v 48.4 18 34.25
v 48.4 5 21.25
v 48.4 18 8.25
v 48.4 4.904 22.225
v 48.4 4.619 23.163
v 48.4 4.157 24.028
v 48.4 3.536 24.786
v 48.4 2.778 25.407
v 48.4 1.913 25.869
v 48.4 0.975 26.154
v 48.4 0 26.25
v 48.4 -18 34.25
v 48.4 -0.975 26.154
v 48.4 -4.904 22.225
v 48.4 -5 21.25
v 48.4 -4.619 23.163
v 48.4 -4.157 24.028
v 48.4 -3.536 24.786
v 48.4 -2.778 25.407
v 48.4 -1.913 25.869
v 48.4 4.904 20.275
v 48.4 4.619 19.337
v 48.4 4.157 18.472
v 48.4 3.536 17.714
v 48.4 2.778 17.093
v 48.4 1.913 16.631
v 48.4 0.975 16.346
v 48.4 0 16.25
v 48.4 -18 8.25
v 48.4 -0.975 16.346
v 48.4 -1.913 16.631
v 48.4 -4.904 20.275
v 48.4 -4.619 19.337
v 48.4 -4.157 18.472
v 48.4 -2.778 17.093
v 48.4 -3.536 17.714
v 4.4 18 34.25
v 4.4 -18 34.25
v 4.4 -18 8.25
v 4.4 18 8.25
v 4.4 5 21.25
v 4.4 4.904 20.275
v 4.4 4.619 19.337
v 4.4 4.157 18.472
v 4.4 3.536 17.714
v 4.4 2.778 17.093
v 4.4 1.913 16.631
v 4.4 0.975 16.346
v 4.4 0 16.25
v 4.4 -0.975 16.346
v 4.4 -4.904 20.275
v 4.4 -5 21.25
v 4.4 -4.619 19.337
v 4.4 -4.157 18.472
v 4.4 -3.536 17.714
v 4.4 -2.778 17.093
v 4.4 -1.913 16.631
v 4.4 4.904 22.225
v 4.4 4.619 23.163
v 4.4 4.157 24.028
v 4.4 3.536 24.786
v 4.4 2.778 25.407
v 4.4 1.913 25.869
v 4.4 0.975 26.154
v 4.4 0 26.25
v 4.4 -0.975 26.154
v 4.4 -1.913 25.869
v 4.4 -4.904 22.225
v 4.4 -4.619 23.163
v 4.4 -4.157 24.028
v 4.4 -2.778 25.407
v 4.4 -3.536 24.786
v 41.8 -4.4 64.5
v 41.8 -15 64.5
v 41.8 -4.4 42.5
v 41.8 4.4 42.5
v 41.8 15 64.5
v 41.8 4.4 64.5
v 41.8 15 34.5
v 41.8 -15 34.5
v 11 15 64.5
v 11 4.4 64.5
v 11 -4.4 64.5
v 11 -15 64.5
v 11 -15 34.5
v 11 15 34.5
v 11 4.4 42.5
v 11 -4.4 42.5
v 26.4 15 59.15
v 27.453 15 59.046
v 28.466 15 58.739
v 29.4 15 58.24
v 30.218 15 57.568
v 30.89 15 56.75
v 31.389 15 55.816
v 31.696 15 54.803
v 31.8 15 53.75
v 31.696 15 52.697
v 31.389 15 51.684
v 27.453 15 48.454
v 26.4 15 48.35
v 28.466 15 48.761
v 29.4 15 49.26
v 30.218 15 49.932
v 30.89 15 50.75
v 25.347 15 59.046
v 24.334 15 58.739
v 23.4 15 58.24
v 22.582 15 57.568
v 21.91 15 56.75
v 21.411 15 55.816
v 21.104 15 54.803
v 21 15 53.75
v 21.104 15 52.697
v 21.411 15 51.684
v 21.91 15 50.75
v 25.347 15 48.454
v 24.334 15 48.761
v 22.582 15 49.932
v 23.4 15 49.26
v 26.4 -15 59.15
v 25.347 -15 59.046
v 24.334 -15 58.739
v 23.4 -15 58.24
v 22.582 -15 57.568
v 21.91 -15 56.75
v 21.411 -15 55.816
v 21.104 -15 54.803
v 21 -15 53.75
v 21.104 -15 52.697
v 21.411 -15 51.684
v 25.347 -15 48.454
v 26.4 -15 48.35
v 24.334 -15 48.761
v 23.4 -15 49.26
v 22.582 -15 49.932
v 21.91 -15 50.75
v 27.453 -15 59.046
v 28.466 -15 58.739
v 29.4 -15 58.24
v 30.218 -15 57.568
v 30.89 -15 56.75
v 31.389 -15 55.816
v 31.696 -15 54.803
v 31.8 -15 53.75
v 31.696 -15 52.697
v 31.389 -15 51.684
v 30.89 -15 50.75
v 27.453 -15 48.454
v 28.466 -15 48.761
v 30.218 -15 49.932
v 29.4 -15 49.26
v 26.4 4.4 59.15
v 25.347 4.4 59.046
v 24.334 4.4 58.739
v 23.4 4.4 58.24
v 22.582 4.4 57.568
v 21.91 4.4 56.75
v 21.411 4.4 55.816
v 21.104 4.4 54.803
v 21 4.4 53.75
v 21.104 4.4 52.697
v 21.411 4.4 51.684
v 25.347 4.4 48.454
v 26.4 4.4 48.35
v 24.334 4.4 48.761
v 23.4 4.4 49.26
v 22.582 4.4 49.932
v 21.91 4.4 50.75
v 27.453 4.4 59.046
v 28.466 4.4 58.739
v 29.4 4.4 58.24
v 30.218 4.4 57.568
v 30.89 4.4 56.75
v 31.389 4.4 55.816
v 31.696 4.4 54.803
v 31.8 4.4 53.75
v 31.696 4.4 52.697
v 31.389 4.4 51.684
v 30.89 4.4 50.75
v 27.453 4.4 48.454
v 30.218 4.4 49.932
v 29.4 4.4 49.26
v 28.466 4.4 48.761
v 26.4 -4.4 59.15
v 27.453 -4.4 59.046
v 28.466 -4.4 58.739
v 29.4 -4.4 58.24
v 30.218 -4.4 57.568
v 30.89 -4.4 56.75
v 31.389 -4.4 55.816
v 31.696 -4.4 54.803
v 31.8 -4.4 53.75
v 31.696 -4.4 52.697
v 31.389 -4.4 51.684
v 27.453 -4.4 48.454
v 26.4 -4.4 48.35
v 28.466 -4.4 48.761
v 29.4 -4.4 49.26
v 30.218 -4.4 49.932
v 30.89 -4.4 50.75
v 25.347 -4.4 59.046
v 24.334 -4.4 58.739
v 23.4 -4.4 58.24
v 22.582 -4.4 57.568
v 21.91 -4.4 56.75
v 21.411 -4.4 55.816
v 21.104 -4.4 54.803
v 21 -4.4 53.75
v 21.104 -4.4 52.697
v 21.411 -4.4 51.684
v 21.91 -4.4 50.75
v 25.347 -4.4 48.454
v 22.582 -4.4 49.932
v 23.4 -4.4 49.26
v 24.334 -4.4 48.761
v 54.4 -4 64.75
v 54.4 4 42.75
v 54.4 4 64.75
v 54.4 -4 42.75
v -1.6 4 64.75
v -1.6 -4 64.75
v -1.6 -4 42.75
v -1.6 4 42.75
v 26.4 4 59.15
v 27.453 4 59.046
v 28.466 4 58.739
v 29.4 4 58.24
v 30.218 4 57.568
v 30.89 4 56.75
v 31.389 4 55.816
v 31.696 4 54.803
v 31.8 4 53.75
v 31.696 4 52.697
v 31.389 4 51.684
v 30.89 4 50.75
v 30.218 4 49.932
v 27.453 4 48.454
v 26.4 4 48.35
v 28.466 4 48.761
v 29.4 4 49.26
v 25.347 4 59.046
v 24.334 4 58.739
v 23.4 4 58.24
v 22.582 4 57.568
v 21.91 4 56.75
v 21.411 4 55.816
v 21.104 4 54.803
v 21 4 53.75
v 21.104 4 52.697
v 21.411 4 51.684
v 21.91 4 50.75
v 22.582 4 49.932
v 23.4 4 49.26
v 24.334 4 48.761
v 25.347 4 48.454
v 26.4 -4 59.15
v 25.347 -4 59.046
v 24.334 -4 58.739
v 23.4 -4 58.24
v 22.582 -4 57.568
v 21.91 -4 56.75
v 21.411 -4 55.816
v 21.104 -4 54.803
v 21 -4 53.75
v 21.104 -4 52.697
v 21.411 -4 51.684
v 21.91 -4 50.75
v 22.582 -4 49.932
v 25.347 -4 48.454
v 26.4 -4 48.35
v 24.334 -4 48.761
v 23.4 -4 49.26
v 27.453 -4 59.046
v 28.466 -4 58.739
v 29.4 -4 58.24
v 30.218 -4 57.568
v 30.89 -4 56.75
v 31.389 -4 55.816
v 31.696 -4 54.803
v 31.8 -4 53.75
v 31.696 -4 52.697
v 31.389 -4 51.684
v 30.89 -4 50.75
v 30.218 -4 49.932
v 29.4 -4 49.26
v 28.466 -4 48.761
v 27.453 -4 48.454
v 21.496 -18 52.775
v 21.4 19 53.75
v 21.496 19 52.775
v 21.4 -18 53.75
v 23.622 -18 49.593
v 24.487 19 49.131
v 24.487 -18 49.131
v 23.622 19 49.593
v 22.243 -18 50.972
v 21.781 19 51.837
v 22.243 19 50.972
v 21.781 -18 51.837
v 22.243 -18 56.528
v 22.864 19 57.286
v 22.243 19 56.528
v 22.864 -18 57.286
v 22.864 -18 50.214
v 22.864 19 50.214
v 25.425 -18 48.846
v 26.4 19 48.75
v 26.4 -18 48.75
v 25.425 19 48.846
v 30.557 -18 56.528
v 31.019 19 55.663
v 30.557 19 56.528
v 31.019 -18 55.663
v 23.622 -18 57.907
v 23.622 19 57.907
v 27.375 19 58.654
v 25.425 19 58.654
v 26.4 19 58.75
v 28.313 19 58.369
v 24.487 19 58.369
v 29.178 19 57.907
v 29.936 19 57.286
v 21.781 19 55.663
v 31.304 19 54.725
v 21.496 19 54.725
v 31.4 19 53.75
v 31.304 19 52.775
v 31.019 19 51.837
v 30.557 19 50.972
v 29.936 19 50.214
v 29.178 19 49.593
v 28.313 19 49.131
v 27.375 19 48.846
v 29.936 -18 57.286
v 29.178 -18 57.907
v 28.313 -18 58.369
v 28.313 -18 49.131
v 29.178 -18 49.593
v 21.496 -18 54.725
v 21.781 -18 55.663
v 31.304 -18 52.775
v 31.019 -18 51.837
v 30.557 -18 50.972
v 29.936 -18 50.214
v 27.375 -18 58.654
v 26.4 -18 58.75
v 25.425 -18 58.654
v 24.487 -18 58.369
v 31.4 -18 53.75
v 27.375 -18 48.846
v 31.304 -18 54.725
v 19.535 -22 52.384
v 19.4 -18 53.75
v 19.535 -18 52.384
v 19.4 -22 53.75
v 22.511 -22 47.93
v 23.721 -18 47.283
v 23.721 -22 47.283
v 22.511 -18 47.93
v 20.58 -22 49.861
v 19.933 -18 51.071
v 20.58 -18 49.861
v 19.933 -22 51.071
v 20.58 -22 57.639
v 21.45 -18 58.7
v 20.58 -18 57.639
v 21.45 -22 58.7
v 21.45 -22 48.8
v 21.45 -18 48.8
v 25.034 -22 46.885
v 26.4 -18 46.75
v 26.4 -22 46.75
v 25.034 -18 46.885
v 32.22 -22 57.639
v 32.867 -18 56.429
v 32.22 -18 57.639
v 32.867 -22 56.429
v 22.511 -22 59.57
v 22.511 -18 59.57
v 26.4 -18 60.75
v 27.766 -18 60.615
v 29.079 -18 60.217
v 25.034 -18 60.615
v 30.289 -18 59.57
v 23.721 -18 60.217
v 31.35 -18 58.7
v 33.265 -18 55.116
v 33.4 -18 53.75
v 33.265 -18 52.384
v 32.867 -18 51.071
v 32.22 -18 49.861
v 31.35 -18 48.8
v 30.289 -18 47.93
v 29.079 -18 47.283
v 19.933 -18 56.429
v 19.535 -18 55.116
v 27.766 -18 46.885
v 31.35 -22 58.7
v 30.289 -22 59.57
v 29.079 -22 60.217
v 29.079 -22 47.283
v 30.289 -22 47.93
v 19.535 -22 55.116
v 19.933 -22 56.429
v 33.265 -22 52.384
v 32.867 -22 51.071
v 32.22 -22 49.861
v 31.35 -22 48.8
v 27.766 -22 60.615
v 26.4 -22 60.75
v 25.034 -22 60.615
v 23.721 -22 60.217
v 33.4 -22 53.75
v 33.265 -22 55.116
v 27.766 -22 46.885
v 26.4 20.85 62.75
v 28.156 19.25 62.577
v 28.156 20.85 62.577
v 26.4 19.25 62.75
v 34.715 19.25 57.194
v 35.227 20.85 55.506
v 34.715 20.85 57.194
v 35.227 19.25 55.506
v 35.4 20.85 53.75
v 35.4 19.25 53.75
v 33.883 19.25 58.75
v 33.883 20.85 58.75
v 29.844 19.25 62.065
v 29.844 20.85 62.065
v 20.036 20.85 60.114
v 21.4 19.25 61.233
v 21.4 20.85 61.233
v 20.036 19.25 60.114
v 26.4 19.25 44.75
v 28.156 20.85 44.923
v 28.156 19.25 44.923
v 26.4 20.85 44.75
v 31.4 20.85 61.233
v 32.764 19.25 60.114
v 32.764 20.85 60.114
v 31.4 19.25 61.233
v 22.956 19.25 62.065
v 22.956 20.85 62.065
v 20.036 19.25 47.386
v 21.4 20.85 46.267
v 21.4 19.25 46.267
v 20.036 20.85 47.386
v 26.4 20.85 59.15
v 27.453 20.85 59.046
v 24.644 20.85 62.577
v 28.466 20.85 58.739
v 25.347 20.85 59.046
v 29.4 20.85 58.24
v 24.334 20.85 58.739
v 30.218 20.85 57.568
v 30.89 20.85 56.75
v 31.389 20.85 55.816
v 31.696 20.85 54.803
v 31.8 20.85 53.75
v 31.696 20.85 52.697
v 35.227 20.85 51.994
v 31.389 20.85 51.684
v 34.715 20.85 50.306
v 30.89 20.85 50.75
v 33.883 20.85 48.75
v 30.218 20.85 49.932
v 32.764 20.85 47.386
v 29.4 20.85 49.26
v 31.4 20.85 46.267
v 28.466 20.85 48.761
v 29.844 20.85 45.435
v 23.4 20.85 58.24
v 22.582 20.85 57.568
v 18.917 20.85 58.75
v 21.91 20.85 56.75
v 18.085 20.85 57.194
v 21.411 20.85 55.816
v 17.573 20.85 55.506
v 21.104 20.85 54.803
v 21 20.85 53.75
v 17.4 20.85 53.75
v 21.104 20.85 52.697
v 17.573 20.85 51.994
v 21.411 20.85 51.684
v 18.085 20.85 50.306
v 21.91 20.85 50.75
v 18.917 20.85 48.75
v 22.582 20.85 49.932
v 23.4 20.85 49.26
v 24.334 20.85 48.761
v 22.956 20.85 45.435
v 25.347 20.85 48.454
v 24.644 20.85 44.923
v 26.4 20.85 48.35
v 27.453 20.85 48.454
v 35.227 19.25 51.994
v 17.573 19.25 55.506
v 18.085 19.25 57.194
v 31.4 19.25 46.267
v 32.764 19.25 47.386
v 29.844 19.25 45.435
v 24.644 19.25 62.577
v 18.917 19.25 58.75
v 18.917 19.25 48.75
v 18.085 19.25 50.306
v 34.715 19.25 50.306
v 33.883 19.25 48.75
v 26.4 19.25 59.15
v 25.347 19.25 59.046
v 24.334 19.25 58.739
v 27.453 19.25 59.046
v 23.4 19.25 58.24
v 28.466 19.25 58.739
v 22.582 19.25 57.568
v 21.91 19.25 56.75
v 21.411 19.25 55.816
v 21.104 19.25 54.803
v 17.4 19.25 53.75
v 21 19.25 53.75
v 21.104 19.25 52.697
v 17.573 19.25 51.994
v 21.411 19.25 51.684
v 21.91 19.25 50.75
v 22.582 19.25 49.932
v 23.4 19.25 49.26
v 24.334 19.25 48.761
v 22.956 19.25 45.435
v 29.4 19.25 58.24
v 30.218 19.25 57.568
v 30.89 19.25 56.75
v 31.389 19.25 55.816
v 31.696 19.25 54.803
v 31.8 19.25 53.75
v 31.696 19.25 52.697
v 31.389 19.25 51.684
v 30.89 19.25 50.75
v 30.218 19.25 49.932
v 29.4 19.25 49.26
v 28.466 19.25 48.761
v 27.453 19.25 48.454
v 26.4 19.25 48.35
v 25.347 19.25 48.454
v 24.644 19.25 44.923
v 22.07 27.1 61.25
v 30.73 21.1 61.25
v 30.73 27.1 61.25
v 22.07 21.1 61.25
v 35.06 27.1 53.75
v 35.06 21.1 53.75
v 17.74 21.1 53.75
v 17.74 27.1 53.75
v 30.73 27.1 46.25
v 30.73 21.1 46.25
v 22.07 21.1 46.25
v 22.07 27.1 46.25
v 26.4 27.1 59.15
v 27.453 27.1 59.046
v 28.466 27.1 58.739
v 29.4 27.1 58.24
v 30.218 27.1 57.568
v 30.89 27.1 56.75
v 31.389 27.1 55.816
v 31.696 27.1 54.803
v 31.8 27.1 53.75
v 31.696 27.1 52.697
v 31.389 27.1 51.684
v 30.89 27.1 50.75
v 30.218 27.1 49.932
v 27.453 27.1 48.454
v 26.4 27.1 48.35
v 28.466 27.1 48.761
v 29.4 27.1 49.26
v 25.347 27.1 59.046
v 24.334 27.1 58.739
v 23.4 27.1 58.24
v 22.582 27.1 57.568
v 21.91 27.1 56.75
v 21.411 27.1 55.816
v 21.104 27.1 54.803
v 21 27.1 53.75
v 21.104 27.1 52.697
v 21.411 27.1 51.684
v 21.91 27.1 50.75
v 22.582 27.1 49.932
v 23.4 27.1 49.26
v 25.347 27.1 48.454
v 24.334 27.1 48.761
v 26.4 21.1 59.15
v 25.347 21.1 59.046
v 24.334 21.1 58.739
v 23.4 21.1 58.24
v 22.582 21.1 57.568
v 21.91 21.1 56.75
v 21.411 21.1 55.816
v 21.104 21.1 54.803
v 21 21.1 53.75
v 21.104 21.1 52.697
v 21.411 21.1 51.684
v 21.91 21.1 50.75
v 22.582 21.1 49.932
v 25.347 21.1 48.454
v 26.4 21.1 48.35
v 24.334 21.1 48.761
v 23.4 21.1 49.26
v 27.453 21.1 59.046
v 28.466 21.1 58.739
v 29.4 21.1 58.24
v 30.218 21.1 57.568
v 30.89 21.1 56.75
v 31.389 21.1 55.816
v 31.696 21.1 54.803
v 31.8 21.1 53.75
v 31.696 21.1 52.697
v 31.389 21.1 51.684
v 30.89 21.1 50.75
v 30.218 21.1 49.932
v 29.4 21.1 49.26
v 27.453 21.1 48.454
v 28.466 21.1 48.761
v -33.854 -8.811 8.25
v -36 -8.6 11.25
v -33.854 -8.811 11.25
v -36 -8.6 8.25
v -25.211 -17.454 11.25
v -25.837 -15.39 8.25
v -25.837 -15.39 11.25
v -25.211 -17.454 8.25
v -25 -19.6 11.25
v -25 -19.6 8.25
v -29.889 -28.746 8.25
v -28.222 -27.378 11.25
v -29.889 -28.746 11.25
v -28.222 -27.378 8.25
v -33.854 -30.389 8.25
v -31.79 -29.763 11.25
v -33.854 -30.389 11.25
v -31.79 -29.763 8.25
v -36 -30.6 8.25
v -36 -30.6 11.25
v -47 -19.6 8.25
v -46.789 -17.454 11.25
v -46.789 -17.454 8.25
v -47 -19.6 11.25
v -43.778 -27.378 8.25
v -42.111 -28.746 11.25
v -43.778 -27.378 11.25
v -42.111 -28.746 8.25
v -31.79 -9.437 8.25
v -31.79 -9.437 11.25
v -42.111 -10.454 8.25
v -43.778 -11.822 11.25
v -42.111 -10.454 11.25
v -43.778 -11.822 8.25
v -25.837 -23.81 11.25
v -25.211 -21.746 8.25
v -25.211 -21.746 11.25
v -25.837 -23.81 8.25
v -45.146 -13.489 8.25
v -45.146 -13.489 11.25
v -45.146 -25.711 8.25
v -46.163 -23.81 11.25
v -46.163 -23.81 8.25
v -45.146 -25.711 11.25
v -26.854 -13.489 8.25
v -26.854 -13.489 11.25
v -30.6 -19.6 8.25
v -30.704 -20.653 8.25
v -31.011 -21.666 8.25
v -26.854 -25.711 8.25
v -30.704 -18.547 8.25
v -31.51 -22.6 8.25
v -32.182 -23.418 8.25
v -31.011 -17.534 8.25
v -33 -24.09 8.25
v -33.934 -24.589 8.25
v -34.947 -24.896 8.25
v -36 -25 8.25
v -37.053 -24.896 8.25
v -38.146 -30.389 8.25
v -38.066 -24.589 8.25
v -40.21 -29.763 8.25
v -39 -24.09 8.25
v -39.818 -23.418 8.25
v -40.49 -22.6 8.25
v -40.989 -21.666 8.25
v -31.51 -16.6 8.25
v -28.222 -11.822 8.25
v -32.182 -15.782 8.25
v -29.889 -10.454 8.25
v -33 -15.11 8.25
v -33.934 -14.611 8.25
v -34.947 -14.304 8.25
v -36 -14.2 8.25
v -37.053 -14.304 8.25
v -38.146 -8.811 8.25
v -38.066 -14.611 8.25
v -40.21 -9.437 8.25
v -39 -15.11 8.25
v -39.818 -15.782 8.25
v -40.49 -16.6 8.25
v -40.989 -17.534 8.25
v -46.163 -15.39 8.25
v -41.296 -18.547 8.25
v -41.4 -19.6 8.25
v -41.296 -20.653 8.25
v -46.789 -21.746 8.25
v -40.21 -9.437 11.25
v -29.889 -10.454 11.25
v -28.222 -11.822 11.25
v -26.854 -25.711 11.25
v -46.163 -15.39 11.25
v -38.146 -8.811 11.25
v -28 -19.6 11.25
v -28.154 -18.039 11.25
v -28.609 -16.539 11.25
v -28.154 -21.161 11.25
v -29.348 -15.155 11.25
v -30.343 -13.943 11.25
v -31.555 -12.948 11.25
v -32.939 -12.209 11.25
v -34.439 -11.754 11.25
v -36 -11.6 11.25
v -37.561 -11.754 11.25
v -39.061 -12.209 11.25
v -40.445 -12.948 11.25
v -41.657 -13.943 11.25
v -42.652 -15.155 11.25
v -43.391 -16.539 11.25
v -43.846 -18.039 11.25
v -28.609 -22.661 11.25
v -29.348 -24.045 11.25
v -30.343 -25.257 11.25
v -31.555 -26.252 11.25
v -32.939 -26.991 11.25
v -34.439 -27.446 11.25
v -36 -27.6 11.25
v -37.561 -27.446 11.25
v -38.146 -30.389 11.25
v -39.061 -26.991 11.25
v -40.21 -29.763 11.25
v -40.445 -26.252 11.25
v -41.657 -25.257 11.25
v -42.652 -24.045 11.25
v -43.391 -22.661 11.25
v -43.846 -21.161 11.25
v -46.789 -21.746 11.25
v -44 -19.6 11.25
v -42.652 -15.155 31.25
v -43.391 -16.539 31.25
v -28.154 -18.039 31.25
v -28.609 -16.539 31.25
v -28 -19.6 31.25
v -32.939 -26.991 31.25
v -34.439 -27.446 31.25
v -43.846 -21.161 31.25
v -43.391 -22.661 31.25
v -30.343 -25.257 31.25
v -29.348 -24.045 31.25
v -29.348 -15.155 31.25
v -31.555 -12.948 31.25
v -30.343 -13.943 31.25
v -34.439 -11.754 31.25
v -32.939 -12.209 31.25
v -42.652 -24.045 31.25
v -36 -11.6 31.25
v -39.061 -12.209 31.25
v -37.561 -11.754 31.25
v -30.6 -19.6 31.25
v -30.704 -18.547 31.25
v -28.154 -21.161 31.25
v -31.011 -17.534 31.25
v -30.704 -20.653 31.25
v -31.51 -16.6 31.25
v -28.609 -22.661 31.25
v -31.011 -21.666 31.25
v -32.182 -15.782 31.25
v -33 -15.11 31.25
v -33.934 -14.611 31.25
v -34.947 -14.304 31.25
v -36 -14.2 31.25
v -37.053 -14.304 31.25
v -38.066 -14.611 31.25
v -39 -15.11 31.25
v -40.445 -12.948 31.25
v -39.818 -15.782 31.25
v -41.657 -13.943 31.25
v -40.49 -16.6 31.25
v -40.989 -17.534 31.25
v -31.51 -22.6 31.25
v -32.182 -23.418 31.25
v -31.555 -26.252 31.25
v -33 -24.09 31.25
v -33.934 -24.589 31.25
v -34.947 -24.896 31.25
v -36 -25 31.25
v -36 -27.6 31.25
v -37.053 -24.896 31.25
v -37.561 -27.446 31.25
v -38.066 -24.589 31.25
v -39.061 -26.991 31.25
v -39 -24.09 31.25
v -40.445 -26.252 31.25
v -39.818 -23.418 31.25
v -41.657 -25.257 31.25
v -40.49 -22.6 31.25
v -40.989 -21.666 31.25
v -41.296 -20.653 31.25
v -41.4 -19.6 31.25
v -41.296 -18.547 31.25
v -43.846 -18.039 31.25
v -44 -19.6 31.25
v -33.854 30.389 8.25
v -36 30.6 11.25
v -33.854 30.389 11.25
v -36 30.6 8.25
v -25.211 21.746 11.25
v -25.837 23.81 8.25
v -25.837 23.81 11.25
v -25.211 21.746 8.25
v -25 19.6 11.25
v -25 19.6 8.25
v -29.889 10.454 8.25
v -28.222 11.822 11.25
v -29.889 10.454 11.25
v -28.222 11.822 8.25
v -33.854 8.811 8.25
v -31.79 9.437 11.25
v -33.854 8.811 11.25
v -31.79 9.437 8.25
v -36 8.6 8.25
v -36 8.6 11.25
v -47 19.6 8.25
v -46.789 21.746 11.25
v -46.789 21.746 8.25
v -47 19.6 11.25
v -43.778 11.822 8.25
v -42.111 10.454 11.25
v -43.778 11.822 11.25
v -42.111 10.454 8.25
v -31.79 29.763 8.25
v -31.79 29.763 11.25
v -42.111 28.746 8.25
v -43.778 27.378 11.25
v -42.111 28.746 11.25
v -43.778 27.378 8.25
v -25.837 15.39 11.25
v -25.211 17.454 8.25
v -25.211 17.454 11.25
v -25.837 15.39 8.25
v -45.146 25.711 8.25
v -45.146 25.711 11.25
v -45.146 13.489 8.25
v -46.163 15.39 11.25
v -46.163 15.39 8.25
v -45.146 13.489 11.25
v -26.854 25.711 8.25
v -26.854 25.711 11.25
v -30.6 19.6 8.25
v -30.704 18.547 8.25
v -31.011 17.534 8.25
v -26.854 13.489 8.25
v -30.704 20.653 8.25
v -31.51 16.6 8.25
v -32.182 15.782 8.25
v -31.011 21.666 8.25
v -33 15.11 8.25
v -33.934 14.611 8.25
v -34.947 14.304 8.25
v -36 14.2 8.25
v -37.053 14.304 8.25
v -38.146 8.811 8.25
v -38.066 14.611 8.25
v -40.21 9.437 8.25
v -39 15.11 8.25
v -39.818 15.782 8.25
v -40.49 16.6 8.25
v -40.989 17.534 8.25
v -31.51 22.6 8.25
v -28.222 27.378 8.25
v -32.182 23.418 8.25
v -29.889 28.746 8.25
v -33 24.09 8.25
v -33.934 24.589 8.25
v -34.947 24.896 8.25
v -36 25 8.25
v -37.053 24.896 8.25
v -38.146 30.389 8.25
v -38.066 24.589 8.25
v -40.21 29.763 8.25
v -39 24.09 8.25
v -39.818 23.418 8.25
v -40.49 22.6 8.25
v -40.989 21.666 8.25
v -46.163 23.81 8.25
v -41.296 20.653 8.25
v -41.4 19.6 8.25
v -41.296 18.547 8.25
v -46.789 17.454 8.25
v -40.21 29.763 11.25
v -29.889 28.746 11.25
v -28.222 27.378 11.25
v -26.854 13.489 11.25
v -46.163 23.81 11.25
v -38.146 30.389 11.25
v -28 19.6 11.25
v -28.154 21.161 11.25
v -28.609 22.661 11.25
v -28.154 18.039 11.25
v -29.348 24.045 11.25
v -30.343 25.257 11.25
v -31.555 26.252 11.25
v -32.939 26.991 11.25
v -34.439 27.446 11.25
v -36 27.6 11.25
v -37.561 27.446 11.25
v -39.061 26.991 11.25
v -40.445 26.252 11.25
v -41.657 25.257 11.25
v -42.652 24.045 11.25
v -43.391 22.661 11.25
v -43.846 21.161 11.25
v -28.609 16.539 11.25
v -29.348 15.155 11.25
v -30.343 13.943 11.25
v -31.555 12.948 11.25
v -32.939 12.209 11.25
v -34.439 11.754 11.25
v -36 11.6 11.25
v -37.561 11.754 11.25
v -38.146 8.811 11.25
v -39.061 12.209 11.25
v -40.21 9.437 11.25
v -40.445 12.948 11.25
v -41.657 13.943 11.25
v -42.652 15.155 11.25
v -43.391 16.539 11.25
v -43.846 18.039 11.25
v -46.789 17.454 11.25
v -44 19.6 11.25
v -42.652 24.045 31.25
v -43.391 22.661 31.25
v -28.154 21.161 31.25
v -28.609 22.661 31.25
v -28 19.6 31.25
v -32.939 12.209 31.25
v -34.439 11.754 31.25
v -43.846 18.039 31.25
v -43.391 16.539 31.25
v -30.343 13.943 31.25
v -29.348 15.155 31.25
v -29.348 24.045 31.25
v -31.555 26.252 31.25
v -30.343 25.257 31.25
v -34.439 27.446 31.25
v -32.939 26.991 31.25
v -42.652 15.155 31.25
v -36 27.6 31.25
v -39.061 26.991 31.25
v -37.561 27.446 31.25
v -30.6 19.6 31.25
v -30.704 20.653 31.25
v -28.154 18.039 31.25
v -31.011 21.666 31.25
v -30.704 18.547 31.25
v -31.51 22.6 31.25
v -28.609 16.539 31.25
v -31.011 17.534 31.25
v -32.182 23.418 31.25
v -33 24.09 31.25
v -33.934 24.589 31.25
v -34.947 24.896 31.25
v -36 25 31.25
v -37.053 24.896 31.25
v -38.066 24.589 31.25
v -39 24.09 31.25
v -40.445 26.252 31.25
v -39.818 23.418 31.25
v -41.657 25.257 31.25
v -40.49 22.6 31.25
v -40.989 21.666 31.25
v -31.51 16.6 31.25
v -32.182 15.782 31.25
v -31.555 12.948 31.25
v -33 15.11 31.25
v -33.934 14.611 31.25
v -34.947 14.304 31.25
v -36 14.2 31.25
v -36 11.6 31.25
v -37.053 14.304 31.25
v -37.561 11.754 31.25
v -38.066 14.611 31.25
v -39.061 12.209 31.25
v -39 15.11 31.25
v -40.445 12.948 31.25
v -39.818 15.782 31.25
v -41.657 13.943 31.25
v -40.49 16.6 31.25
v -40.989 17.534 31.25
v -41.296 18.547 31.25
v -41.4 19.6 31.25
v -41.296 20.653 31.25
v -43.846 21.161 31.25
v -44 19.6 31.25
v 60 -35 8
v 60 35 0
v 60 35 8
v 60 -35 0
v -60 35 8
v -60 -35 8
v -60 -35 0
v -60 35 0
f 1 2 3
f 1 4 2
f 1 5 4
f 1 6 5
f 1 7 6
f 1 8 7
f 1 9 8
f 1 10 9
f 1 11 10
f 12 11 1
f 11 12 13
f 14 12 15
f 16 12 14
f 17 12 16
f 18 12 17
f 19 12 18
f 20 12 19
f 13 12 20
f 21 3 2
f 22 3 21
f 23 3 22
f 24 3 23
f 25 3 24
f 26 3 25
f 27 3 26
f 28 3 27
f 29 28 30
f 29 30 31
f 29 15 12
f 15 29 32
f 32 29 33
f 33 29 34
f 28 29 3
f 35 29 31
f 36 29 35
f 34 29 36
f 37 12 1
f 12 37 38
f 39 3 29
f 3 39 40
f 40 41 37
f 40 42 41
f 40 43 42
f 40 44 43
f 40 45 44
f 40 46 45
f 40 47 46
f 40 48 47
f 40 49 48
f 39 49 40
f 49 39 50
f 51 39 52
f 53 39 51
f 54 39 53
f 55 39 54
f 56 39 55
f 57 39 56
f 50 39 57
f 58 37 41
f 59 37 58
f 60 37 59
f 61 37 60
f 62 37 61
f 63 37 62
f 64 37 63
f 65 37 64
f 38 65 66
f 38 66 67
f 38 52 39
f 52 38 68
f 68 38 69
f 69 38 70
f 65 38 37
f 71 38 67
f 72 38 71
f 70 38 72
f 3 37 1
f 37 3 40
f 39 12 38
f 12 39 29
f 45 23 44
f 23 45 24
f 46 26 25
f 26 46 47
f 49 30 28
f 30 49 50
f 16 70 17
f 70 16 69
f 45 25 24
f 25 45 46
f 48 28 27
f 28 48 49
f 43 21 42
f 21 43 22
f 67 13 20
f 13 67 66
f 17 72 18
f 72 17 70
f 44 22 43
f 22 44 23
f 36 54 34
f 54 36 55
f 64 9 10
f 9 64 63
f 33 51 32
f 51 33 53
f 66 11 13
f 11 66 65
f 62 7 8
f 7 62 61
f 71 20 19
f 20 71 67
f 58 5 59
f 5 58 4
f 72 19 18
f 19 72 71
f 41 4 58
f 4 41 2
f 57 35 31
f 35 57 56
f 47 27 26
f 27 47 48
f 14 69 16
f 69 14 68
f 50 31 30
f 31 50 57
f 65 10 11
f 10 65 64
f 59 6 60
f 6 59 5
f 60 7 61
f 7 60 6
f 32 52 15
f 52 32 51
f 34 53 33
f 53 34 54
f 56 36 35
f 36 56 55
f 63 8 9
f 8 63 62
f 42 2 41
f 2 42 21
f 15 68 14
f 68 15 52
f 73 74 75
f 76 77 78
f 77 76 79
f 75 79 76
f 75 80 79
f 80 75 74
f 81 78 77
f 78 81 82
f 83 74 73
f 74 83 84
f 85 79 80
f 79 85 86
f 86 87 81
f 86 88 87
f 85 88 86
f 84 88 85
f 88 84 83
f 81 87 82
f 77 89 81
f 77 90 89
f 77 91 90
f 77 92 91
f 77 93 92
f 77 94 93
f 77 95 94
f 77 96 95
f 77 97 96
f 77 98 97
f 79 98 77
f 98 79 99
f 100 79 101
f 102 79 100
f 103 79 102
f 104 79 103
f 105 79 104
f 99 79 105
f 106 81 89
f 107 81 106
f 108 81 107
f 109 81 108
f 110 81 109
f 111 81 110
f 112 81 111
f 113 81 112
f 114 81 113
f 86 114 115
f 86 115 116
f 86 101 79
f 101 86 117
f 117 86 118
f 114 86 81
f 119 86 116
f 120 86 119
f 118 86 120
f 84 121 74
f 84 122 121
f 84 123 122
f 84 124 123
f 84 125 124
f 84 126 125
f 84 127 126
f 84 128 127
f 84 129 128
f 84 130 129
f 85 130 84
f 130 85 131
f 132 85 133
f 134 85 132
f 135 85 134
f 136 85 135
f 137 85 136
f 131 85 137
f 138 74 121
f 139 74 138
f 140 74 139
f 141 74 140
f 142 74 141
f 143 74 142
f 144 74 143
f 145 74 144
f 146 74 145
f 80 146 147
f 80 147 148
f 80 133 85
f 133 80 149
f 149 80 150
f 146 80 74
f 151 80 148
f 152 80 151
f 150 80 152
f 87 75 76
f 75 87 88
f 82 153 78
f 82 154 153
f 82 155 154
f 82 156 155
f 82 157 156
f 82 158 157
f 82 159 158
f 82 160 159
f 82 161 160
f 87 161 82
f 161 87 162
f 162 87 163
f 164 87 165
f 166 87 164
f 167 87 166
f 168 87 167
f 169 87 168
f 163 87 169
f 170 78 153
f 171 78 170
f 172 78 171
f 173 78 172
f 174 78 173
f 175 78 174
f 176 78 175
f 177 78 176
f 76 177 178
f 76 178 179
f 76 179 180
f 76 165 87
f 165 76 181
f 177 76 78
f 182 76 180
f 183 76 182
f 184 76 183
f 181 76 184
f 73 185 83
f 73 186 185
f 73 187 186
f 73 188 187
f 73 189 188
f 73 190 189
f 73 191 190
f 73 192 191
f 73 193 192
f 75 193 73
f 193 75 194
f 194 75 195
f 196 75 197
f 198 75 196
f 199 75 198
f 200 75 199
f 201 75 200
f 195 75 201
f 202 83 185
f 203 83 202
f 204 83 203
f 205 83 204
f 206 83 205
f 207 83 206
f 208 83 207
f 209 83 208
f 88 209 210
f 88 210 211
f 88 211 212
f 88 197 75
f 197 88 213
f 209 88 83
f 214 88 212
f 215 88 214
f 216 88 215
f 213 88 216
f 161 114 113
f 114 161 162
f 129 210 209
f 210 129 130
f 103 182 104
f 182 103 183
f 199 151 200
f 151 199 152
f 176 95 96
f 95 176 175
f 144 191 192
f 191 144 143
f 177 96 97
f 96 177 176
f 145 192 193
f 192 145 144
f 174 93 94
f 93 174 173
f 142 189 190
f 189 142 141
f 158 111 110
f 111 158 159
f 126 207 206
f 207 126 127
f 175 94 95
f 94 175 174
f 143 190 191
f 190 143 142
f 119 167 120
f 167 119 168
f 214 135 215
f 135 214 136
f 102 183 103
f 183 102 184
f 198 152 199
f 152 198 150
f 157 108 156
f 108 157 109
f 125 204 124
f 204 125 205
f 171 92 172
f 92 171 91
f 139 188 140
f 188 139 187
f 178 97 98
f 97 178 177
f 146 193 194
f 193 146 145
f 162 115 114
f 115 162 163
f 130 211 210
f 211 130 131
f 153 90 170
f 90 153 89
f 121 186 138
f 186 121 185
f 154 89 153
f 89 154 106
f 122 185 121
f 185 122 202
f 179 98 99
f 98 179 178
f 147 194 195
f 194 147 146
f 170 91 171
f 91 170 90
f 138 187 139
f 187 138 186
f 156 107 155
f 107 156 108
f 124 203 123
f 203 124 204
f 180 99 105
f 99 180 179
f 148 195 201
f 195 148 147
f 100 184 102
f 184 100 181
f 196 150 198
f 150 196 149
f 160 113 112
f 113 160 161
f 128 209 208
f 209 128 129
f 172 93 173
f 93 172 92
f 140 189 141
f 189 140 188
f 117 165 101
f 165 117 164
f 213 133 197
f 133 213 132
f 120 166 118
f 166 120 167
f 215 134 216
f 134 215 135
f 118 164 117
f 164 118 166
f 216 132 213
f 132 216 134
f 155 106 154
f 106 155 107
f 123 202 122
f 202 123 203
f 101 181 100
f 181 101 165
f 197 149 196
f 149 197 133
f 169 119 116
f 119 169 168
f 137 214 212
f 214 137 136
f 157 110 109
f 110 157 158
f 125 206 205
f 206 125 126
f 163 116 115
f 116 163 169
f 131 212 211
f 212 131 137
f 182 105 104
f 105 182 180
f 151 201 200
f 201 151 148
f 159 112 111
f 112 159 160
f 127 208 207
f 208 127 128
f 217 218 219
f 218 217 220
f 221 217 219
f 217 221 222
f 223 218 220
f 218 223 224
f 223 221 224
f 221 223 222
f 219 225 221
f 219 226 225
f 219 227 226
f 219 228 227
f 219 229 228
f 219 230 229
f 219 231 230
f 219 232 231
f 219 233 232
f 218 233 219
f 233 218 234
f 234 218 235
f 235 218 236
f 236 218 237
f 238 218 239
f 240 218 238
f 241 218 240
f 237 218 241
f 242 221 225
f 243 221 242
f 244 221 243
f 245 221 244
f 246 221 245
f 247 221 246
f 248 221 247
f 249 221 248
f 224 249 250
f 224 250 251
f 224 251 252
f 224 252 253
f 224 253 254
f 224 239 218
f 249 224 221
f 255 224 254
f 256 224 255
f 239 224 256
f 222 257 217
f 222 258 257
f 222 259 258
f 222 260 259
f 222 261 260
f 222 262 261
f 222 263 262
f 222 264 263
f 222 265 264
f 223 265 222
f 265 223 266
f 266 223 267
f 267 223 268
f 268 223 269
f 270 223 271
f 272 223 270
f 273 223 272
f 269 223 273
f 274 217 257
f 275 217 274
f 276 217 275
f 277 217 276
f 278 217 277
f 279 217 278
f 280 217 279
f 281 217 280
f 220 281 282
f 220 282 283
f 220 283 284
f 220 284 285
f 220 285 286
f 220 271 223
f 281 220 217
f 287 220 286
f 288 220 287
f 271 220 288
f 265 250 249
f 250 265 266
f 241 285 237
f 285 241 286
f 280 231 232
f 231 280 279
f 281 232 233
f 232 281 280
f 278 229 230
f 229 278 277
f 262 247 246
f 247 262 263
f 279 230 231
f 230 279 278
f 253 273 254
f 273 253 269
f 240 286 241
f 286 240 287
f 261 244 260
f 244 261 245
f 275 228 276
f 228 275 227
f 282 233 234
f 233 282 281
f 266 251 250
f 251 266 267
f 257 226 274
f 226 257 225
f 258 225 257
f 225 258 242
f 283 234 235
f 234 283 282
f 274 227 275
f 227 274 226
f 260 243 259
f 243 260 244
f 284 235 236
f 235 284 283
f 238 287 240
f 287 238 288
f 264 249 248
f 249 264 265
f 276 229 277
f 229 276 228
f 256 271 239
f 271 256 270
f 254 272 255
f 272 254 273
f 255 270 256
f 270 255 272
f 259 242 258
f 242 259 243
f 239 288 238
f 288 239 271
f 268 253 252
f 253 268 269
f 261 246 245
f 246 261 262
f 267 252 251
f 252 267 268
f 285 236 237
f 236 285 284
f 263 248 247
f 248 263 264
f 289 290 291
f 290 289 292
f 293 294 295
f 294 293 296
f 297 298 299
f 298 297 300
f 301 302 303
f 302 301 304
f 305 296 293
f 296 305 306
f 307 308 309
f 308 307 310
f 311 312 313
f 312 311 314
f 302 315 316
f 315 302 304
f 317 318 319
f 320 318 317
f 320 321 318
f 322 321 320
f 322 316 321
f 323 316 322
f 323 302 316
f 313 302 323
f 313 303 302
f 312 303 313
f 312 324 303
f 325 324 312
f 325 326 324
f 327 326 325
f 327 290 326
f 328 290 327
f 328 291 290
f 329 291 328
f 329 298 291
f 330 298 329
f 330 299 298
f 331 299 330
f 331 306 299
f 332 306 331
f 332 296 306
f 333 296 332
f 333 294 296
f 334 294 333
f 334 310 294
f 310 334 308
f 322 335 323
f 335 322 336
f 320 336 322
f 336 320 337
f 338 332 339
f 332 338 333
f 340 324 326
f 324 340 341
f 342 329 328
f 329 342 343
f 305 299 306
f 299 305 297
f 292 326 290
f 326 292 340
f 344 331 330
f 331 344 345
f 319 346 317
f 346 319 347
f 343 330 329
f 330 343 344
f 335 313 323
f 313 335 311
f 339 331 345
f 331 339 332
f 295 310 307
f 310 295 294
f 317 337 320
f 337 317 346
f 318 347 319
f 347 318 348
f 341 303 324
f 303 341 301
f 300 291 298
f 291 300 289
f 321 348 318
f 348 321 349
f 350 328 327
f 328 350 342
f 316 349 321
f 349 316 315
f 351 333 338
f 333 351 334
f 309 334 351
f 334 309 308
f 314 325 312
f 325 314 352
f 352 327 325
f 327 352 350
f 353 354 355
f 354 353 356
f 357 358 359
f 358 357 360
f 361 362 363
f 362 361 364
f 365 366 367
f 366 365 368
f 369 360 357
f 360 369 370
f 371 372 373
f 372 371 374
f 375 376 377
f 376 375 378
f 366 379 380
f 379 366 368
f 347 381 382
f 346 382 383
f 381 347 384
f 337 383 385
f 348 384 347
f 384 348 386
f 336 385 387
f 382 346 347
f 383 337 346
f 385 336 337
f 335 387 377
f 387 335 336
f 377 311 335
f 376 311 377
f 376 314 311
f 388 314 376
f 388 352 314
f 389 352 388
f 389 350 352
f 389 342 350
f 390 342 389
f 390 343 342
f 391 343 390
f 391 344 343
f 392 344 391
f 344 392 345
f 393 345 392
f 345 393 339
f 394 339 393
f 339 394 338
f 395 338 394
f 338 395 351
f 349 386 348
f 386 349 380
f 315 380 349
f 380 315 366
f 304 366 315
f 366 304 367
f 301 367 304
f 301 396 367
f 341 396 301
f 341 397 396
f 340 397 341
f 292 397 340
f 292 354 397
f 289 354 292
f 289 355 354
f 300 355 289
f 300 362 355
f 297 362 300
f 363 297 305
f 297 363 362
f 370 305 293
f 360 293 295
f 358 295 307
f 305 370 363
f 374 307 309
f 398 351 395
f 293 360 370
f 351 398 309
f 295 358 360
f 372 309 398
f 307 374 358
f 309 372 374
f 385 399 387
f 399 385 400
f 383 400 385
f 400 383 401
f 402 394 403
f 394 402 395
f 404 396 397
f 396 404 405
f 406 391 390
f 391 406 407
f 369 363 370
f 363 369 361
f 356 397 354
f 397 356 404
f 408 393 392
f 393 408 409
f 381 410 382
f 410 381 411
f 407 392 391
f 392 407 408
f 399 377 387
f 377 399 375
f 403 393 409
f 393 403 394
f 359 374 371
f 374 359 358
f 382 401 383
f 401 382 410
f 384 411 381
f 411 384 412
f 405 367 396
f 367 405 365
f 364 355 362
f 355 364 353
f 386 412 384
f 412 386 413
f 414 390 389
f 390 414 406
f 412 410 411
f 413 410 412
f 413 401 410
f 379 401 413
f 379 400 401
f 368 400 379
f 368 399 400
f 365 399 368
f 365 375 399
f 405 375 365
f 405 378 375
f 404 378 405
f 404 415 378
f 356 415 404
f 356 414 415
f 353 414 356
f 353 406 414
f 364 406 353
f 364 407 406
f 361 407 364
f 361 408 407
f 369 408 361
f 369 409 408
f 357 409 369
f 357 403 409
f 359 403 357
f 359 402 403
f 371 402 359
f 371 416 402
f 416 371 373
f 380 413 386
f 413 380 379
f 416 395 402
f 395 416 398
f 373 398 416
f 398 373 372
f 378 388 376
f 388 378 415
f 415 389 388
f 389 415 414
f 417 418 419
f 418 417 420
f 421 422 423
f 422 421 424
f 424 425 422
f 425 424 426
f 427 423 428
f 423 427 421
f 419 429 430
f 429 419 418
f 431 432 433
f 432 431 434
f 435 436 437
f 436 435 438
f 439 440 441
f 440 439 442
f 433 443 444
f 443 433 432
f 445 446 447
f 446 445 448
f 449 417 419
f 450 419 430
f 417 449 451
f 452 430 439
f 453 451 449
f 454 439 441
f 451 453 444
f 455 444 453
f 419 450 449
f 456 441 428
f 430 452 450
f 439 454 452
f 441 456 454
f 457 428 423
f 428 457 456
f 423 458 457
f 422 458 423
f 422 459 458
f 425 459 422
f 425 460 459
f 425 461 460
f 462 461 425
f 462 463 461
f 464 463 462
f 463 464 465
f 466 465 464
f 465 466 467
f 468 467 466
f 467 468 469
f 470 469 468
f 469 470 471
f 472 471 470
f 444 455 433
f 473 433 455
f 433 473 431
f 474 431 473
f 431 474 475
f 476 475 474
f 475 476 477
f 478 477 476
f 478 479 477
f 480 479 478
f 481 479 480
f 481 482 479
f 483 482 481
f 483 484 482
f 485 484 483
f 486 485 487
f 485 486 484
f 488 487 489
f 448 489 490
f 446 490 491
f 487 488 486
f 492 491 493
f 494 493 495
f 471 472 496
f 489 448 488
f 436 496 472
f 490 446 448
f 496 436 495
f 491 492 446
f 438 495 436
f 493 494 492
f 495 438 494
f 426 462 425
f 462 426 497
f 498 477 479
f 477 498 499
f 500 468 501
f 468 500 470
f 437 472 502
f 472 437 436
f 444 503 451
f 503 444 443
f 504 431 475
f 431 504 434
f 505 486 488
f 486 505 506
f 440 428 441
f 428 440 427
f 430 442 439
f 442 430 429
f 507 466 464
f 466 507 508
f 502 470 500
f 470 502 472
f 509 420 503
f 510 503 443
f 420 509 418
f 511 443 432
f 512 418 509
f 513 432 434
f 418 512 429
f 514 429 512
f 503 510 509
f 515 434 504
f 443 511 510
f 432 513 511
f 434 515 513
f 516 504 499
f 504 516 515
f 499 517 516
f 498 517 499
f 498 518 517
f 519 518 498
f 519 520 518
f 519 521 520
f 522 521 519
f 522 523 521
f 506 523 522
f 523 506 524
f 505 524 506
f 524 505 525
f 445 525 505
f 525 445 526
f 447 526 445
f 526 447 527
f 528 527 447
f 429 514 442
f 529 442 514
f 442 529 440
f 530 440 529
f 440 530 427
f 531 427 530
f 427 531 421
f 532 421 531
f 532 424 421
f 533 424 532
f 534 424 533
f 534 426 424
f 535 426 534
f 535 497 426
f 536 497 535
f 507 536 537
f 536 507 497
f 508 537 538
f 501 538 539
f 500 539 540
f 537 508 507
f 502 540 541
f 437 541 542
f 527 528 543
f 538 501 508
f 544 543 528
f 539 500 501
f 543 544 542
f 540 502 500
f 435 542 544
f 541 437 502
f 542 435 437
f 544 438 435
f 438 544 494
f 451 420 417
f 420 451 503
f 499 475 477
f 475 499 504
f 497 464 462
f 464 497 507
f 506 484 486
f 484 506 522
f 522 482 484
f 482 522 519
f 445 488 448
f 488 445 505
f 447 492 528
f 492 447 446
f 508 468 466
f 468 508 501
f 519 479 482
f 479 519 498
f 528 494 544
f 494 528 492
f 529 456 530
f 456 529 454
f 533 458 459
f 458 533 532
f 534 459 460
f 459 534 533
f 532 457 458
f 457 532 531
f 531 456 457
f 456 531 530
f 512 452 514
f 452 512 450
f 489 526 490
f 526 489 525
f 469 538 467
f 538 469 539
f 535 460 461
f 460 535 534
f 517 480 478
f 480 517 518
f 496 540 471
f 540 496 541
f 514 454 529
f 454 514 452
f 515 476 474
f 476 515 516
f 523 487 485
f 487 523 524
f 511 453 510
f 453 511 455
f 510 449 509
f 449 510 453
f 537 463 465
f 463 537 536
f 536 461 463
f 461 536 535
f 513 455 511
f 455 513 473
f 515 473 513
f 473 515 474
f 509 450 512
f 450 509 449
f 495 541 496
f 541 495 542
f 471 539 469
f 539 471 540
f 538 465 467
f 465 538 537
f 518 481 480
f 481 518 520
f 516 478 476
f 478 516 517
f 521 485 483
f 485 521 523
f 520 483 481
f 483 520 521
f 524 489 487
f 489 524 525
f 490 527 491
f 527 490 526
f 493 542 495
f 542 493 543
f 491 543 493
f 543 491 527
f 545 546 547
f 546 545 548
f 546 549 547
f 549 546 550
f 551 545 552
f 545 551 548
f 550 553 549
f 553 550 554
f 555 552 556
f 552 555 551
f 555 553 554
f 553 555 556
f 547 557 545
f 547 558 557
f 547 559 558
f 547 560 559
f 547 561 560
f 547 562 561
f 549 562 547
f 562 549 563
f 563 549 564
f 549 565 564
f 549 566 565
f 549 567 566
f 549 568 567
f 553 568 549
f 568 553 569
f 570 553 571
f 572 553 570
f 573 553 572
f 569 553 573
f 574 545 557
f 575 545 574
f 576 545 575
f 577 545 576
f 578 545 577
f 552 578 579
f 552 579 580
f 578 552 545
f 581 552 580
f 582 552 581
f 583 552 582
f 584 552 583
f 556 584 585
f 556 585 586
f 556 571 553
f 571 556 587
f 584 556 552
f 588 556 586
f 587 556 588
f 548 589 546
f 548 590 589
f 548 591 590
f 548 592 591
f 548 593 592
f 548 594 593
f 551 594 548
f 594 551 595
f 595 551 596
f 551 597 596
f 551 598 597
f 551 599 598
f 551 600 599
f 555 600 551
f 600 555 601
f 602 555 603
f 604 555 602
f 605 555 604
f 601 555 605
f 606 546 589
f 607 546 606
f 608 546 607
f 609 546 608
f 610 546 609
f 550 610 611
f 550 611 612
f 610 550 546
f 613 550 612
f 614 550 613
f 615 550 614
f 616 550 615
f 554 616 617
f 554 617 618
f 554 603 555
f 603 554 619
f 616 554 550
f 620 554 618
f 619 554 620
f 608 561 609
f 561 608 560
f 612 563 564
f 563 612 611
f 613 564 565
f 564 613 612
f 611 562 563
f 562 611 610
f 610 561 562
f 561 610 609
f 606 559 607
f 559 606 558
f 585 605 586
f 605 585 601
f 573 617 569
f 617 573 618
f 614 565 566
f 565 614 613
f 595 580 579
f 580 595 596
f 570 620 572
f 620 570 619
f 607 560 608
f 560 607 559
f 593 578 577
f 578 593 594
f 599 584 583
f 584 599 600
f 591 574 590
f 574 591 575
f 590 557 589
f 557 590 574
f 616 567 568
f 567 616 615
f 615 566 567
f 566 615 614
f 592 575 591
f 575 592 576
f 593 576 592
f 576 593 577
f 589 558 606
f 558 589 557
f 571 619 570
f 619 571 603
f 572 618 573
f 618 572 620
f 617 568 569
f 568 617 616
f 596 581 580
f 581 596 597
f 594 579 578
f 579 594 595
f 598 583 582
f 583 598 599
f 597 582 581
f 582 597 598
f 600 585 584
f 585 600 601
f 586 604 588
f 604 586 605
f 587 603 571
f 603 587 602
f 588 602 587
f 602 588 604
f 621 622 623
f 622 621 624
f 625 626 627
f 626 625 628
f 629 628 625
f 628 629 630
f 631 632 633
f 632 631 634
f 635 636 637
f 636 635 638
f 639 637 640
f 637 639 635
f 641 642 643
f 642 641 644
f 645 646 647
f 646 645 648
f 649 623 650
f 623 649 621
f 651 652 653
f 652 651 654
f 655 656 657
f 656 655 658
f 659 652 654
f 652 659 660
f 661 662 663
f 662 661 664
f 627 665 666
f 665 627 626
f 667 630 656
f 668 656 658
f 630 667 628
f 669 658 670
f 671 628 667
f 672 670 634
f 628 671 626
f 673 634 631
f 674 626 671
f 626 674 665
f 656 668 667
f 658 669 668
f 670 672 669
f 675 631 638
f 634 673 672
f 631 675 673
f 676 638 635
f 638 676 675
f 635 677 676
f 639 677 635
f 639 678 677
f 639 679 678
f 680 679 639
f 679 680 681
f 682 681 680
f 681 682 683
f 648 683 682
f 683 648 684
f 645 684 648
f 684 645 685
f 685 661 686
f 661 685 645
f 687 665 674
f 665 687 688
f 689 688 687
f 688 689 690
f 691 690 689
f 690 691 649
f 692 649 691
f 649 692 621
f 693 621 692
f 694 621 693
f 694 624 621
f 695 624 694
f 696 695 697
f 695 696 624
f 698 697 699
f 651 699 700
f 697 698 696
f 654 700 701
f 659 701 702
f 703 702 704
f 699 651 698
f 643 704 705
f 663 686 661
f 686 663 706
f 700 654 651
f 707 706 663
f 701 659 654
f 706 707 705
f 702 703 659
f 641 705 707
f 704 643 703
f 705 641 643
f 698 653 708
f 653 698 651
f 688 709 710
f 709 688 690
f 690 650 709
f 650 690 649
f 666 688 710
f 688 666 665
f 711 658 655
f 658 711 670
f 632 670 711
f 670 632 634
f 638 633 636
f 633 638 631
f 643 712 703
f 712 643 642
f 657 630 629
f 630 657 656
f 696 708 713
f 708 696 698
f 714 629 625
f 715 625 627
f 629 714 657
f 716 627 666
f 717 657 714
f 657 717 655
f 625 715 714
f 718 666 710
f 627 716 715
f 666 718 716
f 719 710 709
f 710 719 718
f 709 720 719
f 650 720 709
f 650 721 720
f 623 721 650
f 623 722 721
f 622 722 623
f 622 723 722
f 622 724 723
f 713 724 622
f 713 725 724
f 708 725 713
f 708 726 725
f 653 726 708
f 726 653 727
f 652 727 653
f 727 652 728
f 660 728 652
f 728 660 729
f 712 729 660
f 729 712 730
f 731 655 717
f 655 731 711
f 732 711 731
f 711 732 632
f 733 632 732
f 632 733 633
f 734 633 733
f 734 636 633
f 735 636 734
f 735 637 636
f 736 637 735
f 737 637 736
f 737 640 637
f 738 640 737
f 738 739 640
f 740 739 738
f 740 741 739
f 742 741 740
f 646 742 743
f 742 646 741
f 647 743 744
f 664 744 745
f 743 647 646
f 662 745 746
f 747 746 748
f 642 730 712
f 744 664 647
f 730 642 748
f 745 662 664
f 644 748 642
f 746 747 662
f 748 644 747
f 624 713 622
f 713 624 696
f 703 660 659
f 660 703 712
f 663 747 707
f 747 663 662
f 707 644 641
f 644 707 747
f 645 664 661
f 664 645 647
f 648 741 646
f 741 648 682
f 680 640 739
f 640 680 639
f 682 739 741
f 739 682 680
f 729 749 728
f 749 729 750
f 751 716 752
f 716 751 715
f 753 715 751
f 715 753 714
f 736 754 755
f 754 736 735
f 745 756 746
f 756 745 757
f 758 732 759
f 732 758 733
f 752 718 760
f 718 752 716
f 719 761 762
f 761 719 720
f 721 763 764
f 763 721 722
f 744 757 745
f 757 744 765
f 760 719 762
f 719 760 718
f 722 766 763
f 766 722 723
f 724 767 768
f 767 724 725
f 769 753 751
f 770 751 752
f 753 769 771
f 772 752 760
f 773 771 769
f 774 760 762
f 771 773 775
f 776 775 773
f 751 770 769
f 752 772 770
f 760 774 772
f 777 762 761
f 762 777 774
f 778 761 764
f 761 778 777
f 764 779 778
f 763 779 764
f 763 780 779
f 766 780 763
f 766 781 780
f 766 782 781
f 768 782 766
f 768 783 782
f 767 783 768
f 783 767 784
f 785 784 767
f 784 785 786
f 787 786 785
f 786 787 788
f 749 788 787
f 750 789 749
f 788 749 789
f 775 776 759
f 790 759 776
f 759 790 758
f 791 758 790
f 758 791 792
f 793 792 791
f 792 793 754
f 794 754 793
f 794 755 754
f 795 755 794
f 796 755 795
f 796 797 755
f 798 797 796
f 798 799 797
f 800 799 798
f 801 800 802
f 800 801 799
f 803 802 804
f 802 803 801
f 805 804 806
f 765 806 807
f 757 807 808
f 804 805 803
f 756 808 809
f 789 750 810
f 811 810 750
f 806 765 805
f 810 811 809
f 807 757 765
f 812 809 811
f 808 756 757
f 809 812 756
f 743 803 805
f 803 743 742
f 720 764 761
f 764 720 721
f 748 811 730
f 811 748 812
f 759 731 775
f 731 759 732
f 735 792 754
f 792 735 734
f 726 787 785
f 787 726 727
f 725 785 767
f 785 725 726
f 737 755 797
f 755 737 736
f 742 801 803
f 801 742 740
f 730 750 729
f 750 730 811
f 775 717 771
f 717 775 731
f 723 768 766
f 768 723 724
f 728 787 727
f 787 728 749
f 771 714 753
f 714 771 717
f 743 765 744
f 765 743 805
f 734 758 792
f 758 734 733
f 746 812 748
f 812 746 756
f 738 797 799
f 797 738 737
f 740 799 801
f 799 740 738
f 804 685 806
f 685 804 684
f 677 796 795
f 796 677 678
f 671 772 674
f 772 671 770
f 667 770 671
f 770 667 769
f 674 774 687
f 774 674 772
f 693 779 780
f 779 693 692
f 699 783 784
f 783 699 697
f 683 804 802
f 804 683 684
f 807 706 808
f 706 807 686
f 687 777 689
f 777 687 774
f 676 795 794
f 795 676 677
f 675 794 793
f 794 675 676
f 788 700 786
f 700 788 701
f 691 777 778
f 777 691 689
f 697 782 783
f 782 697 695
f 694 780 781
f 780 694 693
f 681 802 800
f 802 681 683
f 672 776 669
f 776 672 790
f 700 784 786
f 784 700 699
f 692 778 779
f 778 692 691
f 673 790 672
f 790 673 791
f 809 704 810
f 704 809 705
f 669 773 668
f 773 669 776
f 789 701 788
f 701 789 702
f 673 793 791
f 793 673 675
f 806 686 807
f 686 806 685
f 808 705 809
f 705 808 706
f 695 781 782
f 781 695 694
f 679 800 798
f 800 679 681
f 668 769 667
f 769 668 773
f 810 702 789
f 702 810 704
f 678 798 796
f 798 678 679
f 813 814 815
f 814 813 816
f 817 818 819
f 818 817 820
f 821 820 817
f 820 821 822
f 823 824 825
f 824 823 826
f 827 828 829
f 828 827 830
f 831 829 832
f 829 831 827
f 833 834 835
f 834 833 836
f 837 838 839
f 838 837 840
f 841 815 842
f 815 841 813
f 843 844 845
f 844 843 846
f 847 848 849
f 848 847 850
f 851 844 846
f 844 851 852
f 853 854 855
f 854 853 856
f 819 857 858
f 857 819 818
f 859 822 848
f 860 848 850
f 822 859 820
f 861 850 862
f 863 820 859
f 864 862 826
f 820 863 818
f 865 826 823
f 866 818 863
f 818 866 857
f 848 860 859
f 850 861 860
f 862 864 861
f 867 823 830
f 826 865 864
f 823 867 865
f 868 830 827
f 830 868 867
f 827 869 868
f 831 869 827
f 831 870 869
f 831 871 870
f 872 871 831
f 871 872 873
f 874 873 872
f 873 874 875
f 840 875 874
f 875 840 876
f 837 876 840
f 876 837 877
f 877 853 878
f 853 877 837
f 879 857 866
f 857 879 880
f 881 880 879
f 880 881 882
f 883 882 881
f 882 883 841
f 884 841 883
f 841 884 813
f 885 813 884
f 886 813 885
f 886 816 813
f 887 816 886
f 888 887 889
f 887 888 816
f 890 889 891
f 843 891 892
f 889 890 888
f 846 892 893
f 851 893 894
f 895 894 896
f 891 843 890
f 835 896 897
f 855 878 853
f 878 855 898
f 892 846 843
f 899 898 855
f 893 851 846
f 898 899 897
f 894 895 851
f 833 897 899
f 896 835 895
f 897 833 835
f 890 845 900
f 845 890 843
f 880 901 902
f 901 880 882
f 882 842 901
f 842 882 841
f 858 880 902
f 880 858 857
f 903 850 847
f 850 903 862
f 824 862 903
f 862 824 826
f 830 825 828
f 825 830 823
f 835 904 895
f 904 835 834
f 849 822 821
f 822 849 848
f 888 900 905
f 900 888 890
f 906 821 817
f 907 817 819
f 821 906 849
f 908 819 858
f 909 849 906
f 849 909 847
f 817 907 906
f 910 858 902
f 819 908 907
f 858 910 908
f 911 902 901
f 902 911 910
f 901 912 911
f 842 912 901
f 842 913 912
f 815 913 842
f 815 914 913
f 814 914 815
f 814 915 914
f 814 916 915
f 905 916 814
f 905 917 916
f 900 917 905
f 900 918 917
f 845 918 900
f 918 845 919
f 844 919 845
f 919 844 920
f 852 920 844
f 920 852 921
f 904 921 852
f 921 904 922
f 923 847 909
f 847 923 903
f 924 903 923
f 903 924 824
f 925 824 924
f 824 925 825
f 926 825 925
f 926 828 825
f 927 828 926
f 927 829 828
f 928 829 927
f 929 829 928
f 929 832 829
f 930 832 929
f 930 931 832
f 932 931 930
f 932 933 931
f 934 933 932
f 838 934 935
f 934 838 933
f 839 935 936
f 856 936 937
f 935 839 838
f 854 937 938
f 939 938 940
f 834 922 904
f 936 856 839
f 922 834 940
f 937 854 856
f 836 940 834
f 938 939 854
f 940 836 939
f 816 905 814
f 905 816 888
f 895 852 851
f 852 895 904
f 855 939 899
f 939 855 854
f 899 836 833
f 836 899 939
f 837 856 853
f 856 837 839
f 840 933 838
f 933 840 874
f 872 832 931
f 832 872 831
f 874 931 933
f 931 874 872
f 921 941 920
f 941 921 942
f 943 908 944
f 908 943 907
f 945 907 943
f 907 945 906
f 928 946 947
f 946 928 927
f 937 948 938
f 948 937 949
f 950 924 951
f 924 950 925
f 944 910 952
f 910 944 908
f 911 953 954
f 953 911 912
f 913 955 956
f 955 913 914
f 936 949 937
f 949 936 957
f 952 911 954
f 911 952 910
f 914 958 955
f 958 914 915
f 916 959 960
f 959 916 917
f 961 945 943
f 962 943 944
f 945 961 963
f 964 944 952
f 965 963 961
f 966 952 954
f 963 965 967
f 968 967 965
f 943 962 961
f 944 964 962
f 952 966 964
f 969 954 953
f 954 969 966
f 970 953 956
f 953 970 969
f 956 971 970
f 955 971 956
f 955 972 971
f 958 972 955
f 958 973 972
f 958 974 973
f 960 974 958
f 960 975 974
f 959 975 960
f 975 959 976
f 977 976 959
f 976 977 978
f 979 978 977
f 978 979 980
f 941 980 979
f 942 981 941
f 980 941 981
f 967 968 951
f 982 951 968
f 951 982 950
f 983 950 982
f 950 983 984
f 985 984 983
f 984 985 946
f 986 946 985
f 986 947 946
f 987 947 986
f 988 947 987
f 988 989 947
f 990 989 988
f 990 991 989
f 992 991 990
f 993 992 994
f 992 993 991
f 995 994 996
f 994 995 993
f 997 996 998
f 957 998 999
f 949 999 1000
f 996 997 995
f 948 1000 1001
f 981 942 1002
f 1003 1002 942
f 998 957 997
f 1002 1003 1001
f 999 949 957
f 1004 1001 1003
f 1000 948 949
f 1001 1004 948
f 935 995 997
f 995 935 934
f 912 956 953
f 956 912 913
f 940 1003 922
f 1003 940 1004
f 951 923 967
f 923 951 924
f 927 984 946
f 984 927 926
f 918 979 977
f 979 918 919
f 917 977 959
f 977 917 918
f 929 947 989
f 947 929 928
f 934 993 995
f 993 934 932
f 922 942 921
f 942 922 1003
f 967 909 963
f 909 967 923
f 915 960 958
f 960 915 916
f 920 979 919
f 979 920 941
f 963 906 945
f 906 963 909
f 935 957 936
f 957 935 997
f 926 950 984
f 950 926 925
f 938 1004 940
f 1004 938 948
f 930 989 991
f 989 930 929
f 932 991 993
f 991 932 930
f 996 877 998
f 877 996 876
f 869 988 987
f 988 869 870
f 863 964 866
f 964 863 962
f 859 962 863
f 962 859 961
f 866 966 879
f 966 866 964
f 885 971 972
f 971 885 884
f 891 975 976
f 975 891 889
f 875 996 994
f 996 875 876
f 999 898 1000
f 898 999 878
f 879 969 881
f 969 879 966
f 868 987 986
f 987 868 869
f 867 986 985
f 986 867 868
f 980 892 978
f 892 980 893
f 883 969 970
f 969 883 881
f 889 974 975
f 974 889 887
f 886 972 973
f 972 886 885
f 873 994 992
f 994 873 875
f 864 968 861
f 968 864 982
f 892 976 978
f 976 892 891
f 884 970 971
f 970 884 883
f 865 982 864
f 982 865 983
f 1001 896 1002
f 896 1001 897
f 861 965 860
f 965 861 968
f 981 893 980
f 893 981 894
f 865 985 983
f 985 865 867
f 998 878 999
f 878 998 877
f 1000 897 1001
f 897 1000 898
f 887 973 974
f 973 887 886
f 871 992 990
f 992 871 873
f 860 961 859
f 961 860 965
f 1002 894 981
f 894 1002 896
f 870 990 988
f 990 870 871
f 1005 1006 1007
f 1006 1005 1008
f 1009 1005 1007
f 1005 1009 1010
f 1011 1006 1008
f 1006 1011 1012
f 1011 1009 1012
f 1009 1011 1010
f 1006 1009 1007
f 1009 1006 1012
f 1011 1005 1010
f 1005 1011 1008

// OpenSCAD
$fn = 32;

// ------------------------------------------------------------------------
// Indexing jig: plate 120 x 70 mm, pin d10
// Every part is its own module, assembly() places every instance.
// ------------------------------------------------------------------------

// --- part 1 ---
module jig_plate() {
  difference() {
    translate([-60, -35, 0]) cube([120, 70, 8]);
  }
}

// --- part 2 ---
module locator_block() {
  difference() {
    translate([-22, -18, 0]) cube([44, 36, 26]);
    translate([0, 0, 13]) rotate([0, 90, 0]) cylinder(h = 46, d = 10, center = true);
  }
}

// --- part 3 ---
module index_fork() {
  difference() {
    translate([-15.4, -15, 0]) cube([30.8, 30, 30]);
    translate([-16.4, -4.4, 8]) cube([32.8, 8.8, 23]);
    translate([0, 0, 19.25]) rotate([90, 0, 0]) cylinder(h = 32, d = 10.8, center = true);
  }
}

// --- part 4 ---
module index_arm() {
  difference() {
    translate([-28, -4, 0]) cube([56, 8, 22]);
    translate([0, 0, 11]) rotate([90, 0, 0]) cylinder(h = 10, d = 10.8, center = true);
  }
}

// --- part 5 ---
module index_pin() {
  rotate([0, 90, 0]) cylinder(h = 38, d = 10, center = true);
  translate([-22, 0, 0]) rotate([0, 90, 0]) cylinder(h = 4, d = 14);
}

// --- part 6 ---
module pin_washer() {
  difference() {
      translate([0, 0, 0]) cylinder(h = 1.6, d = 18);
      translate([0, 0, -1]) cylinder(h = 3.6, d = 10.8);
    }
}

// --- part 7 ---
module lock_nut() {
  difference() {
    linear_extrude(height = 6) polygon(points = [[8.66, 0], [4.33, 7.5], [-4.33, 7.5], [-8.66, 0], [-4.33, -7.5], [4.33, -7.5]]);
    translate([0, 0, -1]) cylinder(h = 8, d = 10.8);
  }
}

// --- part 8 ---
module guide_bush_a() {
  difference() {
    union() {
      cylinder(h = 3, d = 22);
      translate([0, 0, 3]) cylinder(h = 20, d = 16);
    }
    translate([0, 0, -1]) cylinder(h = 25, d = 10.8);
  }
}

// --- part 9 ---
module guide_bush_b() {
  difference() {
    union() {
      cylinder(h = 3, d = 22);
      translate([0, 0, 3]) cylinder(h = 20, d = 16);
    }
    translate([0, 0, -1]) cylinder(h = 25, d = 10.8);
  }
}

// --- assembly ---
module assembly() {
  color([0.80, 0.24, 0.20]) translate([0, 0, 0]) rotate([0, 0, 0]) jig_plate();
  color([0.20, 0.45, 0.75]) translate([26.4, 0, 8.25]) rotate([0, 0, 0]) locator_block();
  color([0.25, 0.62, 0.32]) translate([26.4, 0, 34.5]) rotate([0, 0, 0]) index_fork();
  color([0.92, 0.70, 0.18]) translate([26.4, 0, 42.75]) rotate([0, 0, 0]) index_arm();
  color([0.58, 0.35, 0.70]) translate([26.4, 0, 53.75]) rotate([0, 0, 90]) index_pin();
  color([0.16, 0.66, 0.66]) translate([26.4, 20.85, 53.75]) rotate([90, 0, 0]) pin_washer();
  color([0.85, 0.48, 0.18]) translate([26.4, 27.1, 53.75]) rotate([90, 0, 0]) lock_nut();
  color([0.55, 0.60, 0.65]) translate([-36, -19.6, 8.25]) rotate([0, 0, 0]) guide_bush_a();
  color([0.75, 0.30, 0.55]) translate([-36, 19.6, 8.25]) rotate([0, 0, 0]) guide_bush_b();
}

assembly();
